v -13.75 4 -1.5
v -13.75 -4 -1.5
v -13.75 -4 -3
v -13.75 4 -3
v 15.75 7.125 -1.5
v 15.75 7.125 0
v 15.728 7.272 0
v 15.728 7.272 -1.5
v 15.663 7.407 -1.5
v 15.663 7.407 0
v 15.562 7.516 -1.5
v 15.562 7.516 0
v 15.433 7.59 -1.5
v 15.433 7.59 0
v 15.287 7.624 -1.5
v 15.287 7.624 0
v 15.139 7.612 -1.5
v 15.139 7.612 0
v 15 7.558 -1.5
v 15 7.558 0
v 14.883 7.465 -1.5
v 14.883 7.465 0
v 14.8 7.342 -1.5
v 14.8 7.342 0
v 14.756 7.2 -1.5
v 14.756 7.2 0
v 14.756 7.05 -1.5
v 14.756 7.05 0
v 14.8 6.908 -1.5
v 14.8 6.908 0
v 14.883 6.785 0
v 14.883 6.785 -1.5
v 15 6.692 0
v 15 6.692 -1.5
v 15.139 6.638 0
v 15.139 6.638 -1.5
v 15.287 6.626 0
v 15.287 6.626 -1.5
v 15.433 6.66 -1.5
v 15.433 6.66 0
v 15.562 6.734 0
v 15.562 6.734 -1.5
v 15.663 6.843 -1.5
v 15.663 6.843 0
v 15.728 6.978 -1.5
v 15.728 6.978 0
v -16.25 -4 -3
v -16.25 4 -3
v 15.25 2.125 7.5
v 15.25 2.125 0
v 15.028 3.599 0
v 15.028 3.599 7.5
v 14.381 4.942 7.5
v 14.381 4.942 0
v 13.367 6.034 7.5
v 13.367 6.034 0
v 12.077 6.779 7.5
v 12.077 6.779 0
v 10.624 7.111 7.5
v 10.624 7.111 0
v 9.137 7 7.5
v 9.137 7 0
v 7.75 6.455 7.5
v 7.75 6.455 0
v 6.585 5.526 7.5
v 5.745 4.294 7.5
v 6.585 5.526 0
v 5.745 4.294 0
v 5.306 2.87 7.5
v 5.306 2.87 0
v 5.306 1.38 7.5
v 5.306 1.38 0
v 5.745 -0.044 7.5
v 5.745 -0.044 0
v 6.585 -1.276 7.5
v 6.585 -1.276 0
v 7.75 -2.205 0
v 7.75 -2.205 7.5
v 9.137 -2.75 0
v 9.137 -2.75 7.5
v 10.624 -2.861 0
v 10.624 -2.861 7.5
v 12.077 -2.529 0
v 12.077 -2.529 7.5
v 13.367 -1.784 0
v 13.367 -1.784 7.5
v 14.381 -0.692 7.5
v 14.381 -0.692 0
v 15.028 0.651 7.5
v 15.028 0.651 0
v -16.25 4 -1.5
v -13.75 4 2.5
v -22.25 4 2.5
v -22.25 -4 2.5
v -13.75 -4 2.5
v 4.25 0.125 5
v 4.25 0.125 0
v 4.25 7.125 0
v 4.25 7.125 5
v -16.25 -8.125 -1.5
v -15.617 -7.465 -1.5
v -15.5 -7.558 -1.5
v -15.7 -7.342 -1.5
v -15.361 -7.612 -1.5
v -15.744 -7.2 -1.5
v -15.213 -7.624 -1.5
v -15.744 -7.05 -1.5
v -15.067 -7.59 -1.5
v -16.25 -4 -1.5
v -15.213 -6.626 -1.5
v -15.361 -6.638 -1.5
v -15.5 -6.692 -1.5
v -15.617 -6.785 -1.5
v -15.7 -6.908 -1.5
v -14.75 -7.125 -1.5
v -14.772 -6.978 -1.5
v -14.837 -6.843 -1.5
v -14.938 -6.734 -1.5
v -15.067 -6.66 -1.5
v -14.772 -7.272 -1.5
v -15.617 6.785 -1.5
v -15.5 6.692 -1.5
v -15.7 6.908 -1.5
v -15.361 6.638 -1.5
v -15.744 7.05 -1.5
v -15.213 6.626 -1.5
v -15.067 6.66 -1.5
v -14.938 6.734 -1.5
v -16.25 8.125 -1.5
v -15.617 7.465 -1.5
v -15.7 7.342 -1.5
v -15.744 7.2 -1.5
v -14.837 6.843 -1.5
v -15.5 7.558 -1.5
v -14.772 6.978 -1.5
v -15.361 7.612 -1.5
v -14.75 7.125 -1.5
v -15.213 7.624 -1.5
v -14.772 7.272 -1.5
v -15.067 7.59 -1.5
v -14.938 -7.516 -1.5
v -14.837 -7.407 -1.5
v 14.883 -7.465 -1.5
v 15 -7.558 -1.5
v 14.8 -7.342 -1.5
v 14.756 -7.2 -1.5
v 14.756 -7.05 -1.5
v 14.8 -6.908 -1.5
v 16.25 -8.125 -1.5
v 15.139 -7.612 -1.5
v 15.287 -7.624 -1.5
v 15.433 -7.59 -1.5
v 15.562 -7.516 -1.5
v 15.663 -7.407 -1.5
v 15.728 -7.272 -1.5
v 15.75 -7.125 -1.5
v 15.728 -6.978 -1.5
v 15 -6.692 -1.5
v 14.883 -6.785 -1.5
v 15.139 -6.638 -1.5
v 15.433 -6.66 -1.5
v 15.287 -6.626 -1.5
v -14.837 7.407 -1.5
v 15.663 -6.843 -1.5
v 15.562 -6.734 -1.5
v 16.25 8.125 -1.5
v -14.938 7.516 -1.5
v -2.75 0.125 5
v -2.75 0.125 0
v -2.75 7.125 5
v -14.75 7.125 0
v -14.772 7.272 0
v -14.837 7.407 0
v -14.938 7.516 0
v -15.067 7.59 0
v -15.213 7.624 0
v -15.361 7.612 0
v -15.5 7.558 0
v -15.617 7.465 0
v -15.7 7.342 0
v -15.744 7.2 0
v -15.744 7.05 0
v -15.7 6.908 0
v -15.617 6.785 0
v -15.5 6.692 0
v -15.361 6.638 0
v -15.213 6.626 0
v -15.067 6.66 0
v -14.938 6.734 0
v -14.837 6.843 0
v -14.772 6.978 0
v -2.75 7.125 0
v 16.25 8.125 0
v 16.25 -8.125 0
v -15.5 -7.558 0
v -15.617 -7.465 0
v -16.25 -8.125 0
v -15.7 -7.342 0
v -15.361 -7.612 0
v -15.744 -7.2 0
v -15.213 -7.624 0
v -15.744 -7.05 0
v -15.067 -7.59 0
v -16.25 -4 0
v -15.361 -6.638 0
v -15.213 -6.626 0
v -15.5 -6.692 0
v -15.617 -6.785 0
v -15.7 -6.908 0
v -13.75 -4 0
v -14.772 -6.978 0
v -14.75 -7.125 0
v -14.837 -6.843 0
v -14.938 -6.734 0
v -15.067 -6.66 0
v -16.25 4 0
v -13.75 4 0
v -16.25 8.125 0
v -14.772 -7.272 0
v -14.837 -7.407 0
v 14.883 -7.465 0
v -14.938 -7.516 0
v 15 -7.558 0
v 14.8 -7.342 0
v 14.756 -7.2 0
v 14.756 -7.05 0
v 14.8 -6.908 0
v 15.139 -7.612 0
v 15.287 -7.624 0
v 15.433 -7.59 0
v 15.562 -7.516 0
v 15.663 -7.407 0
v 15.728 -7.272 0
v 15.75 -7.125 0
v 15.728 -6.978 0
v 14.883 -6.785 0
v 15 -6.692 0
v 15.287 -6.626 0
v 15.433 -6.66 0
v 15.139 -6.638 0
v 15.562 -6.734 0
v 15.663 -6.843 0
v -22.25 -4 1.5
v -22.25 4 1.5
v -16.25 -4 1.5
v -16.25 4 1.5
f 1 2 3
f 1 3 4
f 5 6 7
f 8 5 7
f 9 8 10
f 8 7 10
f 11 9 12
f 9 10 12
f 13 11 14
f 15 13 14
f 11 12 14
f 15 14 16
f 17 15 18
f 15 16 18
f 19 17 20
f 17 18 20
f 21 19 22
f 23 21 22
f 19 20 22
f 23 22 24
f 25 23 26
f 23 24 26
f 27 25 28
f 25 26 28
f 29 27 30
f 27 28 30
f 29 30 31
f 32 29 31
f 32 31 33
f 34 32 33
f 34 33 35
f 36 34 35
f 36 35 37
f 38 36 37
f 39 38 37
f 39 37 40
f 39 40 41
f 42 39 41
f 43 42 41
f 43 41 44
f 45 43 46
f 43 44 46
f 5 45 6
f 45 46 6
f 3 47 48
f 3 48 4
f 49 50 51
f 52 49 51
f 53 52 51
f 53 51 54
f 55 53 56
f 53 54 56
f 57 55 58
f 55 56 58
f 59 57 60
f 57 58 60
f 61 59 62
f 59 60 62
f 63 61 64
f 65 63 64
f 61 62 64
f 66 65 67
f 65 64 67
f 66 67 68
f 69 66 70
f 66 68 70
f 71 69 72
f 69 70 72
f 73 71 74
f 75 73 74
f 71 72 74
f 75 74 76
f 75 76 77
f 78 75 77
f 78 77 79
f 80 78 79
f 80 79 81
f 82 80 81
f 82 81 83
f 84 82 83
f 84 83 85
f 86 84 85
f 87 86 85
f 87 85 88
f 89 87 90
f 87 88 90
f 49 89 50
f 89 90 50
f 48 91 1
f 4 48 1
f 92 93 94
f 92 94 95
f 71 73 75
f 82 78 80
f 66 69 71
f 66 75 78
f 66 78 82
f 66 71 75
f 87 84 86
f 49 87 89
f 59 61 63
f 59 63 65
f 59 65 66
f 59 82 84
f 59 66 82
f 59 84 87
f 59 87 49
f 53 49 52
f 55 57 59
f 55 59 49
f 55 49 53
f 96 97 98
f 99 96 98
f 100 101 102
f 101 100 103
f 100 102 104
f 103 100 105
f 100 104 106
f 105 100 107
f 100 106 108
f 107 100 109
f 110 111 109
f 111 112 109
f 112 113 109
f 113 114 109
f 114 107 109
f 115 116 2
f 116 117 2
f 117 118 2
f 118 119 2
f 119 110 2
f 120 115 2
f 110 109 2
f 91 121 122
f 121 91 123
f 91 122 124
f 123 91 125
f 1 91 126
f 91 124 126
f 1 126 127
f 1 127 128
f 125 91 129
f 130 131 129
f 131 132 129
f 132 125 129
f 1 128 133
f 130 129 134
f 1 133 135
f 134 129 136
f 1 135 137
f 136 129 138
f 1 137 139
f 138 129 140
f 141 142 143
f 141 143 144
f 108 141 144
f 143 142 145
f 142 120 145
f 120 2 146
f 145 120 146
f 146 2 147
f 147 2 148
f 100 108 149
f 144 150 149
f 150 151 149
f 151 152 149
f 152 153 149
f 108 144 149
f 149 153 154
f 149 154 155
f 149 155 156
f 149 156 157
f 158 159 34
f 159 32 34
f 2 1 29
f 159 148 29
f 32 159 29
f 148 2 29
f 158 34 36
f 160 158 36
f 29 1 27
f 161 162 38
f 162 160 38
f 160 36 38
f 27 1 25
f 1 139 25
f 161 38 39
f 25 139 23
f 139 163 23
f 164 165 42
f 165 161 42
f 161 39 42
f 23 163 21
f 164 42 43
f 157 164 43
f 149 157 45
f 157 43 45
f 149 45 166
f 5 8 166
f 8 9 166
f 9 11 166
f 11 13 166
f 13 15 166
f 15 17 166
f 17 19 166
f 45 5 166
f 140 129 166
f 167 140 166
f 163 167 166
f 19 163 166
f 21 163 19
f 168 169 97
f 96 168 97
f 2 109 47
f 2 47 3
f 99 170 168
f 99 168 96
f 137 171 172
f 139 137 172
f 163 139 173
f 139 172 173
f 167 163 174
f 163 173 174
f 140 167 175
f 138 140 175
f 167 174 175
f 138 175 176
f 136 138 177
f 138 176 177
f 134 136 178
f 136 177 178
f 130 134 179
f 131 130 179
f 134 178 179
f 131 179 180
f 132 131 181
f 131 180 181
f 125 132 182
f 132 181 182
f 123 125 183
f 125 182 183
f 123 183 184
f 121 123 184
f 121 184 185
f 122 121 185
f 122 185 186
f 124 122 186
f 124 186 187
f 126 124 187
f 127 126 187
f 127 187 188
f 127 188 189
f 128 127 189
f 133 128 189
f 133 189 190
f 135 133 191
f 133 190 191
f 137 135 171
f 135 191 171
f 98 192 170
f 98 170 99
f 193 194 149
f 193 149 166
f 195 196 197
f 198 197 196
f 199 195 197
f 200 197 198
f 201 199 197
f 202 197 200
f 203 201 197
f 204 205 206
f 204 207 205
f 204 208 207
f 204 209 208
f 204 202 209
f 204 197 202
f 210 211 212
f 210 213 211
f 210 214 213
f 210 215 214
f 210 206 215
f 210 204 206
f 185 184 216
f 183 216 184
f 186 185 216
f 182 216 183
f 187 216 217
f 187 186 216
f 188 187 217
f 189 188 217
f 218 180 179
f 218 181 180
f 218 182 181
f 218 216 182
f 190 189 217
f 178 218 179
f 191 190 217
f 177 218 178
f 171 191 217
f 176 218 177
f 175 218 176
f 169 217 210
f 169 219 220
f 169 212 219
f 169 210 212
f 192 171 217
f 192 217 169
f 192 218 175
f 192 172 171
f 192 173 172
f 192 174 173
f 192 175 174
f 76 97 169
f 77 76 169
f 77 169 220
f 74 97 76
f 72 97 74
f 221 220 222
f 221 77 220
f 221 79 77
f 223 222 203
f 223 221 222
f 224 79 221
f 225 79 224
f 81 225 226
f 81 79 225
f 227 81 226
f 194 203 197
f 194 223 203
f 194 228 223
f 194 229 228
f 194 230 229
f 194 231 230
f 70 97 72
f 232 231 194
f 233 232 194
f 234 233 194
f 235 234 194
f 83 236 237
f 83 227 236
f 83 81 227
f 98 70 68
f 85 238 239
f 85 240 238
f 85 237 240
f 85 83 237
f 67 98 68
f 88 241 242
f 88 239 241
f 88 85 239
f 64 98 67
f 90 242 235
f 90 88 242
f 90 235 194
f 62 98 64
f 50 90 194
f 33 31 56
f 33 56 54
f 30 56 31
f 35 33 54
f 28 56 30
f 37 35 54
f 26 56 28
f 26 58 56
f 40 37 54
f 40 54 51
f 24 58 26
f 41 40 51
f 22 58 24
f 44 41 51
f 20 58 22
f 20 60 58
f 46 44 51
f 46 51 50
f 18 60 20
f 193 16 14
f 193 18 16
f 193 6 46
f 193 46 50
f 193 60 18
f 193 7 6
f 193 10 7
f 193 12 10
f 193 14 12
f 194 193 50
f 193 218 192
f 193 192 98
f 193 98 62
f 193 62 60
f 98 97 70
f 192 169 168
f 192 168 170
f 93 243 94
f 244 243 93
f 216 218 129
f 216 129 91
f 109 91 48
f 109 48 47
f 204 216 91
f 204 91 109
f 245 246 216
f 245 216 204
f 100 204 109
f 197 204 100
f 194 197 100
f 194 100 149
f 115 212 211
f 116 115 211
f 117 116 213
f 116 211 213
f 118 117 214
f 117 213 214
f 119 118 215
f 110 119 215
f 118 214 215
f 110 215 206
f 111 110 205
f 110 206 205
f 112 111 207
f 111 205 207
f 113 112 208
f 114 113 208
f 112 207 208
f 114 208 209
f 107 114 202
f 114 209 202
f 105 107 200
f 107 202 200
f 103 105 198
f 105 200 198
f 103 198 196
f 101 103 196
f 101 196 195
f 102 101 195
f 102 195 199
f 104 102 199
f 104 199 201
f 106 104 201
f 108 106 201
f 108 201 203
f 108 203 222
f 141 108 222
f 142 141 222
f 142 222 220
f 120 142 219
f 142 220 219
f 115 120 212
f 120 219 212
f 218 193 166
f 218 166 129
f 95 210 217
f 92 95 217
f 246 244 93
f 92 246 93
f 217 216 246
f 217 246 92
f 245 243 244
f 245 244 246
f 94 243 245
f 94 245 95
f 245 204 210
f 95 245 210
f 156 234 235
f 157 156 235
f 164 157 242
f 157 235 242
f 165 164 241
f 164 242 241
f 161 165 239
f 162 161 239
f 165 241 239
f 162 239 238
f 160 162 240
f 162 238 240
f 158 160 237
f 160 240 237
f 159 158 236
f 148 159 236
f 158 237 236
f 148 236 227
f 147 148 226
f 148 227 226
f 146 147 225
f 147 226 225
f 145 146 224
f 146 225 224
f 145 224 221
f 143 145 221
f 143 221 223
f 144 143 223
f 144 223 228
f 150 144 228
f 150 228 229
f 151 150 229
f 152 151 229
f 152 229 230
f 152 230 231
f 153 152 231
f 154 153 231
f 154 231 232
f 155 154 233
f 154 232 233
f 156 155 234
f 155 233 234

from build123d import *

# Parameters (mm, degrees)
F0_R          = 0.5
F0_W          = 7
F0_H          = 7
F0_R_2        = 5
F0_W_2        = 2.5
F0_H_2        = 8
F1_DEPTH      = 1.5
F2_DEPTH      = 7.5
F3_DEPTH      = 5
F4_DEPTH      = 2.5
F4_DEPTH_BACK = 3
F5_START      = 1.5
F0_W_3        = 6
F5_DEPTH      = 1


with BuildPart() as f1:
    # F0 (on Top) → F1 (new body)
    with BuildSketch(Plane.XY):
        Polygon((16.25, 8.125), (-16.25, 8.125), (-16.25, 4), (-13.75, 4), (-13.75, -4), (-16.25, -4), (-16.25, -8.125), (16.25, -8.125), align=None)
        with Locations((-15.25, -7.125)):
            Circle(F0_R, mode=Mode.SUBTRACT)
        with Locations((15.25, -7.125)):
            Circle(F0_R, mode=Mode.SUBTRACT)
        with Locations((-15.25, 7.125)):
            Circle(F0_R, mode=Mode.SUBTRACT)
        with Locations((0.75, 3.625)):
            Rectangle(F0_W, F0_H, mode=Mode.SUBTRACT)
        with Locations((10.25, 2.125)):
            Circle(F0_R_2, mode=Mode.SUBTRACT)
        with Locations((15.25, 7.125)):
            Circle(F0_R, mode=Mode.SUBTRACT)
        with Locations((-15, 0)):
            Rectangle(F0_W_2, F0_H_2)
        with Locations((0.75, 3.625)):
            Rectangle(F0_W, F0_H)
        with Locations((10.25, 2.125)):
            Circle(F0_R_2)
    extrude(amount=-F1_DEPTH)

    # F0 (on Top) → F2 (join)
    with BuildSketch(Plane.XY):
        with Locations((10.25, 2.125)):
            Circle(F0_R_2)
    extrude(amount=F2_DEPTH)

    # F0 (on Top) → F3 (join)
    with BuildSketch(Plane.XY):
        with Locations((0.75, 3.625)):
            Rectangle(F0_W, F0_H)
    extrude(amount=F3_DEPTH)

    # F0 (on Top) → F4 (join, two sides)
    with BuildSketch(Plane.XY) as f4_sk:
        with Locations((-15, 0)):
            Rectangle(F0_W_2, F0_H_2)
    extrude(amount=F4_DEPTH)
    extrude(f4_sk.sketch, amount=-F4_DEPTH_BACK)

    # F0 (on Top) → F5 (join)
    with BuildSketch(Plane.XY.offset(F5_START)):
        with Locations((-19.25, 0)):
            Rectangle(F0_W_3, F0_H_2)
    extrude(amount=F5_DEPTH)


solid = f1.part
